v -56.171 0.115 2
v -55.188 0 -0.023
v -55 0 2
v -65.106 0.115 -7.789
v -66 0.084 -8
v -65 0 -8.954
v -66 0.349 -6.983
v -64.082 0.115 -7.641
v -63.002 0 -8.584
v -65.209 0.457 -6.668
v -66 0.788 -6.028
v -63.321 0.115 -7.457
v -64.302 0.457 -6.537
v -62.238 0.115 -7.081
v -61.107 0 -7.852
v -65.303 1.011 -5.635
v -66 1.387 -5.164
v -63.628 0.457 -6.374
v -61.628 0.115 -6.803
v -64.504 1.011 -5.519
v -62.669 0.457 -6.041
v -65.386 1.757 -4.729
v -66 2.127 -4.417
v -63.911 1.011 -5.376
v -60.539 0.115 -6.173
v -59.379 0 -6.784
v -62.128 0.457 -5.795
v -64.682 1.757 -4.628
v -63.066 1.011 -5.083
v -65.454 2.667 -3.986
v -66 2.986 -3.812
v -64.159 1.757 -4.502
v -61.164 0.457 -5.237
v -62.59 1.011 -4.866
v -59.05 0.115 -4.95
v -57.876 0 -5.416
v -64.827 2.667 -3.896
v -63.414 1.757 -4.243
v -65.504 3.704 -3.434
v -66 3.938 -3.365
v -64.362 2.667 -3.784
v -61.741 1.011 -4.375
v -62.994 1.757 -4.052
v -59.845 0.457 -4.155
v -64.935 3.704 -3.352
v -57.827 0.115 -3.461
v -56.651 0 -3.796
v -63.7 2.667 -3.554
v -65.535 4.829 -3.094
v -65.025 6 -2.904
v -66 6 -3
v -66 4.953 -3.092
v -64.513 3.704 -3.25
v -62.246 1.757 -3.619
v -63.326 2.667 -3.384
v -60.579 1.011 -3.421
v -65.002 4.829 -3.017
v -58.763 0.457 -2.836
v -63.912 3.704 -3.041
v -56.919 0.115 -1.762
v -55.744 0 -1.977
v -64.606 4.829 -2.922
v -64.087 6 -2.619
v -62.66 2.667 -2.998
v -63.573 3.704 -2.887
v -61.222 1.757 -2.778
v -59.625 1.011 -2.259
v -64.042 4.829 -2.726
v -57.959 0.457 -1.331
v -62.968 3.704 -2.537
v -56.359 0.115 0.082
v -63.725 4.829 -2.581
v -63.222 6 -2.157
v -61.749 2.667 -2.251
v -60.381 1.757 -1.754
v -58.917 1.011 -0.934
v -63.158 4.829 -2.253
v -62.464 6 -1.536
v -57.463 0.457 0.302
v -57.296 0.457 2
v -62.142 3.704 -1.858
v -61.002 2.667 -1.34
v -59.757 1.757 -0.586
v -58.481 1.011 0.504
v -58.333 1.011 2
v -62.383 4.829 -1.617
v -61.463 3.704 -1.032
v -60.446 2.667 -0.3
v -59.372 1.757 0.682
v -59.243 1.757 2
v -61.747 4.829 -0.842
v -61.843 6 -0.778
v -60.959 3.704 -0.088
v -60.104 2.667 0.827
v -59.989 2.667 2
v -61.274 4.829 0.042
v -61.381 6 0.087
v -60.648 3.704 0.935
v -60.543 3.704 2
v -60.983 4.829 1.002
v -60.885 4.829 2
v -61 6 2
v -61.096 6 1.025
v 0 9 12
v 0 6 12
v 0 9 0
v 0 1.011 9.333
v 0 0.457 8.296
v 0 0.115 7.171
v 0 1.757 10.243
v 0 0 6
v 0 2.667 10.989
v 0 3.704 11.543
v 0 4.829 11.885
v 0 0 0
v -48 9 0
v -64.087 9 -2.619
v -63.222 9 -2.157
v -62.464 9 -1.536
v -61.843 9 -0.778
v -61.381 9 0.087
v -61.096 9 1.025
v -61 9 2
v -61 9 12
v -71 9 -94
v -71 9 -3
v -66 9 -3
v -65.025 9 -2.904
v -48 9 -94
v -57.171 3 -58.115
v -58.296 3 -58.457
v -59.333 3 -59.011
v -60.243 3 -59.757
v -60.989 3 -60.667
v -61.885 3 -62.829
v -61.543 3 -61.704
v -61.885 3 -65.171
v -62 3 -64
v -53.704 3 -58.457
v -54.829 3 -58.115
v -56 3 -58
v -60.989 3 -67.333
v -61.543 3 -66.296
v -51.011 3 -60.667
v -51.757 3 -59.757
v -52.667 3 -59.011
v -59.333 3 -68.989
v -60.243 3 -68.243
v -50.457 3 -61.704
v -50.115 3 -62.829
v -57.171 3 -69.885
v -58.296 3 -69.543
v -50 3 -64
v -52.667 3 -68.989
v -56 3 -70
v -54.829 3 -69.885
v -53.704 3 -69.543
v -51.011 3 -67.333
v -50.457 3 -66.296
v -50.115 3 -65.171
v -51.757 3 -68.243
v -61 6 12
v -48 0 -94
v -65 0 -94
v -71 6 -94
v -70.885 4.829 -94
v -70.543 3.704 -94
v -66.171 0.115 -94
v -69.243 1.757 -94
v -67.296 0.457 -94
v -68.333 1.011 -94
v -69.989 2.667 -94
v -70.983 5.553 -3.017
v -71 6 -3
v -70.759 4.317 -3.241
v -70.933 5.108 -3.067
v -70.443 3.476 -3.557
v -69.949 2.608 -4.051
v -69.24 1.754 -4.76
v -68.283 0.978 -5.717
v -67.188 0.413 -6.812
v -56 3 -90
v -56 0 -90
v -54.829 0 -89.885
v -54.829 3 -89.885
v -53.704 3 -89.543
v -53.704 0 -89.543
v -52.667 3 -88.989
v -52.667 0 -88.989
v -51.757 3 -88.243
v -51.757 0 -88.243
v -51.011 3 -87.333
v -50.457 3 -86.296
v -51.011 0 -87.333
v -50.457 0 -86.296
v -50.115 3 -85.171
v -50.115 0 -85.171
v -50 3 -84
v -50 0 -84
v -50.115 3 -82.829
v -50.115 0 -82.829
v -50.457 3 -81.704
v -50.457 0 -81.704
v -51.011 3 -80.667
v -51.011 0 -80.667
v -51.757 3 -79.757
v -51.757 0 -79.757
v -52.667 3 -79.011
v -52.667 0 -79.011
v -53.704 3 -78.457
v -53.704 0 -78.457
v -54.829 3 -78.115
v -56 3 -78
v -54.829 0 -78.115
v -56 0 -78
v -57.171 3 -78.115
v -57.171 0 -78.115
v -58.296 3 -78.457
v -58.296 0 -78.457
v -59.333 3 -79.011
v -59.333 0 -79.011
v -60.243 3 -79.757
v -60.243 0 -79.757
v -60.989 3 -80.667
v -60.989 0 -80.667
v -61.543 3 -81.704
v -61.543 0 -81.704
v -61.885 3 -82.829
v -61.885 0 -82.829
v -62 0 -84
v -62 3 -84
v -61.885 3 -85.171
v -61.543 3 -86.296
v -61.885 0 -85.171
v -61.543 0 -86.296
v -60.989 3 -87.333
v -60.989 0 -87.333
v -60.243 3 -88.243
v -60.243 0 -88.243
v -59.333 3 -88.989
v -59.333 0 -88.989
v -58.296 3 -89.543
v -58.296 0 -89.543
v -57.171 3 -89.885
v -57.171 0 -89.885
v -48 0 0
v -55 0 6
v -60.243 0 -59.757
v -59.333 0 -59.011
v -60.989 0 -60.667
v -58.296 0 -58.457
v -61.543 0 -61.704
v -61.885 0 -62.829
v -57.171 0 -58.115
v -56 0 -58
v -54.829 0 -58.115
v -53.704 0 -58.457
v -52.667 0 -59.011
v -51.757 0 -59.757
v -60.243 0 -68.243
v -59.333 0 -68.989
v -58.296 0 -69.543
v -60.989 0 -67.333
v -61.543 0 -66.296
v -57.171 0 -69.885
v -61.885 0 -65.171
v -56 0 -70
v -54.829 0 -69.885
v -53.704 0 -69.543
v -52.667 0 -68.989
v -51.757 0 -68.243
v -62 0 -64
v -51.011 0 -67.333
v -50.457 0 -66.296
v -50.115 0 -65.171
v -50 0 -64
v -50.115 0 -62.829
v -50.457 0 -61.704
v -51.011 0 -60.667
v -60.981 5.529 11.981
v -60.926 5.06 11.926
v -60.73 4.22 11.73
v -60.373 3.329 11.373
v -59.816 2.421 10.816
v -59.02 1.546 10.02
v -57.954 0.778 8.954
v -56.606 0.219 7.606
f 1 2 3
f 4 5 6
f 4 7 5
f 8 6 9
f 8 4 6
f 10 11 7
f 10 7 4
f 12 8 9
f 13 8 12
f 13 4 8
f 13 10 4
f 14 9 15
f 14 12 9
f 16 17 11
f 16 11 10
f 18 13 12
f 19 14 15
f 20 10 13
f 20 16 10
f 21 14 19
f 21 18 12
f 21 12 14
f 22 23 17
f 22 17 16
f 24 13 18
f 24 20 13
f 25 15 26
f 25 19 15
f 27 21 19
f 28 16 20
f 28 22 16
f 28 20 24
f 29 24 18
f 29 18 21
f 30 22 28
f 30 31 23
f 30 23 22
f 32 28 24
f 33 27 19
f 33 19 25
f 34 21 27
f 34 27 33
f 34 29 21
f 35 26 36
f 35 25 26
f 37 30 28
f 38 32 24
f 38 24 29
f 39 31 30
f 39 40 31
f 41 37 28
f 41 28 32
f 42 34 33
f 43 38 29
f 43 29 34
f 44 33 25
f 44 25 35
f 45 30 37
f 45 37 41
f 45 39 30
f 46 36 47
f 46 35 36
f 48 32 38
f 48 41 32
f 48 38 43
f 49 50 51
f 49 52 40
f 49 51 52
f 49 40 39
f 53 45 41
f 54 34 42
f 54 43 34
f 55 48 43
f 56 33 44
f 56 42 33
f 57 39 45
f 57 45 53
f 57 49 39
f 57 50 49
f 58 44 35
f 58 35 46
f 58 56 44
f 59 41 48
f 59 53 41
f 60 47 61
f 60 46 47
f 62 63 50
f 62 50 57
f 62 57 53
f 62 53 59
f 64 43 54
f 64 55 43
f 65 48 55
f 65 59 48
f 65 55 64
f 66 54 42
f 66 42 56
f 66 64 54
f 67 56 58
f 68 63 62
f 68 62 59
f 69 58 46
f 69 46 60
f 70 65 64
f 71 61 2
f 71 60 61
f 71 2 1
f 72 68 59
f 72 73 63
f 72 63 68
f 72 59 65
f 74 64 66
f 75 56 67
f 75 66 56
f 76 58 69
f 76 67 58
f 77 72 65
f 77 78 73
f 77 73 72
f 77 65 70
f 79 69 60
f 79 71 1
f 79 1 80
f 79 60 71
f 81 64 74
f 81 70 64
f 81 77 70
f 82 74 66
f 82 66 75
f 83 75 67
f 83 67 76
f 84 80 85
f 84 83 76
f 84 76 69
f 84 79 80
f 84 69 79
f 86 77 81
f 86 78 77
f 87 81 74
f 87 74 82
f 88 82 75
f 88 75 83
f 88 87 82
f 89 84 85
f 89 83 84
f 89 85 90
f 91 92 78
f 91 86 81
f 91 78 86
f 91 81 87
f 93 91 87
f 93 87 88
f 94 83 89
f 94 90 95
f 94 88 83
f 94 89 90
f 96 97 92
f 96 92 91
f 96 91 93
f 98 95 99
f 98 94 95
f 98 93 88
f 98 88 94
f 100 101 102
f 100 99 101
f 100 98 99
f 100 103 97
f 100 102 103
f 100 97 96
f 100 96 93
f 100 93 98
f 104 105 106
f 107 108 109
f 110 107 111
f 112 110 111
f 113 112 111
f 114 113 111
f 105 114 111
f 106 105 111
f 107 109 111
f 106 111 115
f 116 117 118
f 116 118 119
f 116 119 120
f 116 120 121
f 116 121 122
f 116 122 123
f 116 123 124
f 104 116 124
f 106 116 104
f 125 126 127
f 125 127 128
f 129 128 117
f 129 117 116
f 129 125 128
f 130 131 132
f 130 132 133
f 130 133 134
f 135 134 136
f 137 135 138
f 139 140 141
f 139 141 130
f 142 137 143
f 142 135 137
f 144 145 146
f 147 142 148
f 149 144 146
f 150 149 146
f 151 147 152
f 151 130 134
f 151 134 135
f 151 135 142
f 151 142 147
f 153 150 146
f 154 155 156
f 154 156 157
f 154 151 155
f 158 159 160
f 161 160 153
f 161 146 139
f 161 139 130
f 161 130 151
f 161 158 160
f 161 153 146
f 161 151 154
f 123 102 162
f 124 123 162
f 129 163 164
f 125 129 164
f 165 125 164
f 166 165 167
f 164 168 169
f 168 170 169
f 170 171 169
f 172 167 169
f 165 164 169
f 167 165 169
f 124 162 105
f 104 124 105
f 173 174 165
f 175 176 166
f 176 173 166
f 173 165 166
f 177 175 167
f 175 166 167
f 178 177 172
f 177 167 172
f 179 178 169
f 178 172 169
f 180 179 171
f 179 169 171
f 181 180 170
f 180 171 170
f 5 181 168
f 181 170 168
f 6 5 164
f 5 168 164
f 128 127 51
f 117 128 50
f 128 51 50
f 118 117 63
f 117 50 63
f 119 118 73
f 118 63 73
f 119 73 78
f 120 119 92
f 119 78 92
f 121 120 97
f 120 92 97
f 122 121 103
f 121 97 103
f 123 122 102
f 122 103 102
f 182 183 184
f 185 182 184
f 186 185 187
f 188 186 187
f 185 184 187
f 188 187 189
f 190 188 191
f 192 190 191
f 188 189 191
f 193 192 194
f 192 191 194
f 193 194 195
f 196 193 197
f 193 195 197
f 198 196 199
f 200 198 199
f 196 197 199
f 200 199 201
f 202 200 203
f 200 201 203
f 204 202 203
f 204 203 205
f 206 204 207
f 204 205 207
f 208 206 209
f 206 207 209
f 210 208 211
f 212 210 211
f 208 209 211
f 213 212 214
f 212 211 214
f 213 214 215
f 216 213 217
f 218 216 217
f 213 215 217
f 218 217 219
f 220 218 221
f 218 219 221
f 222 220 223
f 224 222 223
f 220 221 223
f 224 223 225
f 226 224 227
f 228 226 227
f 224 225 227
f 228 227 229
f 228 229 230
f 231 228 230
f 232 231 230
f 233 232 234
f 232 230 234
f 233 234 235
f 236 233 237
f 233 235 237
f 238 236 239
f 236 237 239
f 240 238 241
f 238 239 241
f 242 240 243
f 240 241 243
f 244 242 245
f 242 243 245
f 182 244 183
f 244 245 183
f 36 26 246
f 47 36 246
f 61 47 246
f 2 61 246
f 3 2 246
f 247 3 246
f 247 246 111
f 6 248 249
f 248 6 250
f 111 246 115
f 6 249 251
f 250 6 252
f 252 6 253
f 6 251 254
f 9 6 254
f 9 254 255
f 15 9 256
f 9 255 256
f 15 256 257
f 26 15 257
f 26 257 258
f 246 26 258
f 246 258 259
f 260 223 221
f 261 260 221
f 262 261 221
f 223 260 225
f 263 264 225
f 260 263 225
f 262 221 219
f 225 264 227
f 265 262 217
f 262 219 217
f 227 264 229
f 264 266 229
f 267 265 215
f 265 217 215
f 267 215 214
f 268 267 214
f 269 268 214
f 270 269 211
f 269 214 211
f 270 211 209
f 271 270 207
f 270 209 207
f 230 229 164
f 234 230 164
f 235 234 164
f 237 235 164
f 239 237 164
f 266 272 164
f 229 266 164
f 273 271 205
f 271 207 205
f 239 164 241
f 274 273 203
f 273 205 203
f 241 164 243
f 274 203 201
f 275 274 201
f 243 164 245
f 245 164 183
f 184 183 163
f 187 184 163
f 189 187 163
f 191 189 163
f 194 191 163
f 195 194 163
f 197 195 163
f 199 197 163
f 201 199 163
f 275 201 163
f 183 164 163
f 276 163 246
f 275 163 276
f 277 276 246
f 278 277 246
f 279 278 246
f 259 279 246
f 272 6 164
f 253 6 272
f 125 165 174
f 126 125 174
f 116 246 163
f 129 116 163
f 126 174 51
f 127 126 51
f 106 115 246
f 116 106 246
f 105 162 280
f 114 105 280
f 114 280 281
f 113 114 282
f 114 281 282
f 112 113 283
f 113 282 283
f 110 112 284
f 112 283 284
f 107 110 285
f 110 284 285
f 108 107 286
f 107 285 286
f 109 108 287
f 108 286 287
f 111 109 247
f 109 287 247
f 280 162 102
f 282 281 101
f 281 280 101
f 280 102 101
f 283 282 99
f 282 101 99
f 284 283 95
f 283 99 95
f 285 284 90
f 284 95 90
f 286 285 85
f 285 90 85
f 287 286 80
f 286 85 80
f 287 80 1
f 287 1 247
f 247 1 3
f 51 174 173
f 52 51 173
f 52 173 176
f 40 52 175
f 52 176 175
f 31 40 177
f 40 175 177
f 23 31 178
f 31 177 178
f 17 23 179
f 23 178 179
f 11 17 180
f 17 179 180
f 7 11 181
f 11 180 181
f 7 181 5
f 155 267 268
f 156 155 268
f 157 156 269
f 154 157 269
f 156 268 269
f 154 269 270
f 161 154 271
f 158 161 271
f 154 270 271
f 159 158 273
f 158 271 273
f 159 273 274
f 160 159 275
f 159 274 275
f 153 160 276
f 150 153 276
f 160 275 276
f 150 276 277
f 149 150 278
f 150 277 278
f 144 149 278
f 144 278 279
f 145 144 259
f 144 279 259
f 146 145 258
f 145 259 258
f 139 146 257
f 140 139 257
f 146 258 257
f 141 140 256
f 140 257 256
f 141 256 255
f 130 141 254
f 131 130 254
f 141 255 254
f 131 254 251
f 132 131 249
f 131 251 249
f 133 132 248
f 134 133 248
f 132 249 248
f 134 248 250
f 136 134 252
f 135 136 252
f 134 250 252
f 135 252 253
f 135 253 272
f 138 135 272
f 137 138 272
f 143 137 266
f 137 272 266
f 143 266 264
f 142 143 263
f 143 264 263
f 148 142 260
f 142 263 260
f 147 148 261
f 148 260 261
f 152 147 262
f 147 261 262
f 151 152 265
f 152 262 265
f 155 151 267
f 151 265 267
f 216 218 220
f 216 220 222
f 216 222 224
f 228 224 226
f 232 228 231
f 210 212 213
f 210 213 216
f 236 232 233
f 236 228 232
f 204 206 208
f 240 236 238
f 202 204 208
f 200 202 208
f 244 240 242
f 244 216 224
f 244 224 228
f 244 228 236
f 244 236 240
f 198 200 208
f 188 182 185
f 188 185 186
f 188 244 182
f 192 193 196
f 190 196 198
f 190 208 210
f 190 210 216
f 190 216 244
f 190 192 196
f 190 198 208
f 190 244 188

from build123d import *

# Parameters (mm, degrees)
EXTRUDE_1_DEPTH     = 9
FILLET_1_R          = 6
SKETCH_2_R          = 6
CUT_EXTRUDE_1_DEPTH = 3


with BuildPart() as part:
    # 草圖1 → 填料-伸長1 (new body)
    with BuildSketch(Plane(origin=(0, 0, 0), x_dir=(1, 0, 0), z_dir=(0, 1, 0))):
        with BuildLine():
            Line((0, 0), (-48, 0))
            Line((-48, 0), (-48, 94))
            Line((-48, 94), (-71, 94))
            Line((-71, 94), (-71, 3))
            Line((-71, 3), (-66, 3))
            ThreePointArc((-66, 3), (-62.464466094, 1.535533906), (-61, -2))
            Line((-61, -2), (-61, -12))
            Line((-61, -12), (0, -12))
            Line((0, -12), (0, 0))
        make_face()
    extrude(amount=EXTRUDE_1_DEPTH)

    # 圓角1
    # the kernel refuses this fillet: 6 mm, written as the material it takes off along each edge
    with BuildSketch(Plane(origin=(-76, 0, 12), x_dir=(0, 1, 0), z_dir=(1, 0, 0))) as fillet_1_piece_1:
        with BuildLine():
            CenterArc((FILLET_1_R, -FILLET_1_R), FILLET_1_R, 90, 90)
            Line((0, -FILLET_1_R), (0, 0))
            Line((0, 0), (FILLET_1_R, 0))
        make_face()
    extrude(amount=91, mode=Mode.SUBTRACT)
    with BuildSketch(Plane(origin=(-61, 0, 2), x_dir=(0, 1, 0), z_dir=(0, 0, 1))) as fillet_1_piece_2:
        with BuildLine():
            CenterArc((FILLET_1_R, -FILLET_1_R), FILLET_1_R, 90, 90)
            Line((0, -FILLET_1_R), (0, 0))
            Line((0, 0), (FILLET_1_R, 0))
        make_face()
    extrude(amount=25, mode=Mode.SUBTRACT)
    with BuildSketch(Plane(origin=(-66, 0, 2), x_dir=(0, 0, -1), z_dir=(-1, 0, 0))) as fillet_1_piece_3:
        with BuildLine():
            CenterArc((5 + FILLET_1_R, -FILLET_1_R), FILLET_1_R, 90, 90)
            Line((5 + FILLET_1_R, 0), (5, 0))
            Line((5, 0), (5, -FILLET_1_R))
        make_face()
    revolve(axis=Axis((-66, 0, 2), (0, -1, 0)), revolution_arc=90, mode=Mode.SUBTRACT)
    with BuildSketch(Plane(origin=(-71, 0, -109), x_dir=(0, 1, 0), z_dir=(0, 0, 1))) as fillet_1_piece_4:
        with BuildLine():
            CenterArc((FILLET_1_R, -FILLET_1_R), FILLET_1_R, 90, 90)
            Line((0, -FILLET_1_R), (0, 0))
            Line((0, 0), (FILLET_1_R, 0))
        make_face()
    extrude(amount=121, mode=Mode.SUBTRACT)
    with BuildSketch(Plane(origin=(-86, 0, -3), x_dir=(0, 1, 0), z_dir=(1, 0, 0))) as fillet_1_piece_5:
        with BuildLine():
            CenterArc((FILLET_1_R, -FILLET_1_R), FILLET_1_R, 90, 90)
            Line((0, -FILLET_1_R), (0, 0))
            Line((0, 0), (FILLET_1_R, 0))
        make_face()
    extrude(amount=20, mode=Mode.SUBTRACT)

    # 草圖2 → 除料-伸長1 (cut)
    with BuildSketch(Plane.XZ):
        with Locations(Location((-56, -84, 0), (0, 0, 270))):
            Circle(SKETCH_2_R)
        with Locations(Location((-56, -64, 0), (0, 0, 270))):
            Circle(SKETCH_2_R)
    extrude(amount=-CUT_EXTRUDE_1_DEPTH, mode=Mode.SUBTRACT)


solid = part.part
